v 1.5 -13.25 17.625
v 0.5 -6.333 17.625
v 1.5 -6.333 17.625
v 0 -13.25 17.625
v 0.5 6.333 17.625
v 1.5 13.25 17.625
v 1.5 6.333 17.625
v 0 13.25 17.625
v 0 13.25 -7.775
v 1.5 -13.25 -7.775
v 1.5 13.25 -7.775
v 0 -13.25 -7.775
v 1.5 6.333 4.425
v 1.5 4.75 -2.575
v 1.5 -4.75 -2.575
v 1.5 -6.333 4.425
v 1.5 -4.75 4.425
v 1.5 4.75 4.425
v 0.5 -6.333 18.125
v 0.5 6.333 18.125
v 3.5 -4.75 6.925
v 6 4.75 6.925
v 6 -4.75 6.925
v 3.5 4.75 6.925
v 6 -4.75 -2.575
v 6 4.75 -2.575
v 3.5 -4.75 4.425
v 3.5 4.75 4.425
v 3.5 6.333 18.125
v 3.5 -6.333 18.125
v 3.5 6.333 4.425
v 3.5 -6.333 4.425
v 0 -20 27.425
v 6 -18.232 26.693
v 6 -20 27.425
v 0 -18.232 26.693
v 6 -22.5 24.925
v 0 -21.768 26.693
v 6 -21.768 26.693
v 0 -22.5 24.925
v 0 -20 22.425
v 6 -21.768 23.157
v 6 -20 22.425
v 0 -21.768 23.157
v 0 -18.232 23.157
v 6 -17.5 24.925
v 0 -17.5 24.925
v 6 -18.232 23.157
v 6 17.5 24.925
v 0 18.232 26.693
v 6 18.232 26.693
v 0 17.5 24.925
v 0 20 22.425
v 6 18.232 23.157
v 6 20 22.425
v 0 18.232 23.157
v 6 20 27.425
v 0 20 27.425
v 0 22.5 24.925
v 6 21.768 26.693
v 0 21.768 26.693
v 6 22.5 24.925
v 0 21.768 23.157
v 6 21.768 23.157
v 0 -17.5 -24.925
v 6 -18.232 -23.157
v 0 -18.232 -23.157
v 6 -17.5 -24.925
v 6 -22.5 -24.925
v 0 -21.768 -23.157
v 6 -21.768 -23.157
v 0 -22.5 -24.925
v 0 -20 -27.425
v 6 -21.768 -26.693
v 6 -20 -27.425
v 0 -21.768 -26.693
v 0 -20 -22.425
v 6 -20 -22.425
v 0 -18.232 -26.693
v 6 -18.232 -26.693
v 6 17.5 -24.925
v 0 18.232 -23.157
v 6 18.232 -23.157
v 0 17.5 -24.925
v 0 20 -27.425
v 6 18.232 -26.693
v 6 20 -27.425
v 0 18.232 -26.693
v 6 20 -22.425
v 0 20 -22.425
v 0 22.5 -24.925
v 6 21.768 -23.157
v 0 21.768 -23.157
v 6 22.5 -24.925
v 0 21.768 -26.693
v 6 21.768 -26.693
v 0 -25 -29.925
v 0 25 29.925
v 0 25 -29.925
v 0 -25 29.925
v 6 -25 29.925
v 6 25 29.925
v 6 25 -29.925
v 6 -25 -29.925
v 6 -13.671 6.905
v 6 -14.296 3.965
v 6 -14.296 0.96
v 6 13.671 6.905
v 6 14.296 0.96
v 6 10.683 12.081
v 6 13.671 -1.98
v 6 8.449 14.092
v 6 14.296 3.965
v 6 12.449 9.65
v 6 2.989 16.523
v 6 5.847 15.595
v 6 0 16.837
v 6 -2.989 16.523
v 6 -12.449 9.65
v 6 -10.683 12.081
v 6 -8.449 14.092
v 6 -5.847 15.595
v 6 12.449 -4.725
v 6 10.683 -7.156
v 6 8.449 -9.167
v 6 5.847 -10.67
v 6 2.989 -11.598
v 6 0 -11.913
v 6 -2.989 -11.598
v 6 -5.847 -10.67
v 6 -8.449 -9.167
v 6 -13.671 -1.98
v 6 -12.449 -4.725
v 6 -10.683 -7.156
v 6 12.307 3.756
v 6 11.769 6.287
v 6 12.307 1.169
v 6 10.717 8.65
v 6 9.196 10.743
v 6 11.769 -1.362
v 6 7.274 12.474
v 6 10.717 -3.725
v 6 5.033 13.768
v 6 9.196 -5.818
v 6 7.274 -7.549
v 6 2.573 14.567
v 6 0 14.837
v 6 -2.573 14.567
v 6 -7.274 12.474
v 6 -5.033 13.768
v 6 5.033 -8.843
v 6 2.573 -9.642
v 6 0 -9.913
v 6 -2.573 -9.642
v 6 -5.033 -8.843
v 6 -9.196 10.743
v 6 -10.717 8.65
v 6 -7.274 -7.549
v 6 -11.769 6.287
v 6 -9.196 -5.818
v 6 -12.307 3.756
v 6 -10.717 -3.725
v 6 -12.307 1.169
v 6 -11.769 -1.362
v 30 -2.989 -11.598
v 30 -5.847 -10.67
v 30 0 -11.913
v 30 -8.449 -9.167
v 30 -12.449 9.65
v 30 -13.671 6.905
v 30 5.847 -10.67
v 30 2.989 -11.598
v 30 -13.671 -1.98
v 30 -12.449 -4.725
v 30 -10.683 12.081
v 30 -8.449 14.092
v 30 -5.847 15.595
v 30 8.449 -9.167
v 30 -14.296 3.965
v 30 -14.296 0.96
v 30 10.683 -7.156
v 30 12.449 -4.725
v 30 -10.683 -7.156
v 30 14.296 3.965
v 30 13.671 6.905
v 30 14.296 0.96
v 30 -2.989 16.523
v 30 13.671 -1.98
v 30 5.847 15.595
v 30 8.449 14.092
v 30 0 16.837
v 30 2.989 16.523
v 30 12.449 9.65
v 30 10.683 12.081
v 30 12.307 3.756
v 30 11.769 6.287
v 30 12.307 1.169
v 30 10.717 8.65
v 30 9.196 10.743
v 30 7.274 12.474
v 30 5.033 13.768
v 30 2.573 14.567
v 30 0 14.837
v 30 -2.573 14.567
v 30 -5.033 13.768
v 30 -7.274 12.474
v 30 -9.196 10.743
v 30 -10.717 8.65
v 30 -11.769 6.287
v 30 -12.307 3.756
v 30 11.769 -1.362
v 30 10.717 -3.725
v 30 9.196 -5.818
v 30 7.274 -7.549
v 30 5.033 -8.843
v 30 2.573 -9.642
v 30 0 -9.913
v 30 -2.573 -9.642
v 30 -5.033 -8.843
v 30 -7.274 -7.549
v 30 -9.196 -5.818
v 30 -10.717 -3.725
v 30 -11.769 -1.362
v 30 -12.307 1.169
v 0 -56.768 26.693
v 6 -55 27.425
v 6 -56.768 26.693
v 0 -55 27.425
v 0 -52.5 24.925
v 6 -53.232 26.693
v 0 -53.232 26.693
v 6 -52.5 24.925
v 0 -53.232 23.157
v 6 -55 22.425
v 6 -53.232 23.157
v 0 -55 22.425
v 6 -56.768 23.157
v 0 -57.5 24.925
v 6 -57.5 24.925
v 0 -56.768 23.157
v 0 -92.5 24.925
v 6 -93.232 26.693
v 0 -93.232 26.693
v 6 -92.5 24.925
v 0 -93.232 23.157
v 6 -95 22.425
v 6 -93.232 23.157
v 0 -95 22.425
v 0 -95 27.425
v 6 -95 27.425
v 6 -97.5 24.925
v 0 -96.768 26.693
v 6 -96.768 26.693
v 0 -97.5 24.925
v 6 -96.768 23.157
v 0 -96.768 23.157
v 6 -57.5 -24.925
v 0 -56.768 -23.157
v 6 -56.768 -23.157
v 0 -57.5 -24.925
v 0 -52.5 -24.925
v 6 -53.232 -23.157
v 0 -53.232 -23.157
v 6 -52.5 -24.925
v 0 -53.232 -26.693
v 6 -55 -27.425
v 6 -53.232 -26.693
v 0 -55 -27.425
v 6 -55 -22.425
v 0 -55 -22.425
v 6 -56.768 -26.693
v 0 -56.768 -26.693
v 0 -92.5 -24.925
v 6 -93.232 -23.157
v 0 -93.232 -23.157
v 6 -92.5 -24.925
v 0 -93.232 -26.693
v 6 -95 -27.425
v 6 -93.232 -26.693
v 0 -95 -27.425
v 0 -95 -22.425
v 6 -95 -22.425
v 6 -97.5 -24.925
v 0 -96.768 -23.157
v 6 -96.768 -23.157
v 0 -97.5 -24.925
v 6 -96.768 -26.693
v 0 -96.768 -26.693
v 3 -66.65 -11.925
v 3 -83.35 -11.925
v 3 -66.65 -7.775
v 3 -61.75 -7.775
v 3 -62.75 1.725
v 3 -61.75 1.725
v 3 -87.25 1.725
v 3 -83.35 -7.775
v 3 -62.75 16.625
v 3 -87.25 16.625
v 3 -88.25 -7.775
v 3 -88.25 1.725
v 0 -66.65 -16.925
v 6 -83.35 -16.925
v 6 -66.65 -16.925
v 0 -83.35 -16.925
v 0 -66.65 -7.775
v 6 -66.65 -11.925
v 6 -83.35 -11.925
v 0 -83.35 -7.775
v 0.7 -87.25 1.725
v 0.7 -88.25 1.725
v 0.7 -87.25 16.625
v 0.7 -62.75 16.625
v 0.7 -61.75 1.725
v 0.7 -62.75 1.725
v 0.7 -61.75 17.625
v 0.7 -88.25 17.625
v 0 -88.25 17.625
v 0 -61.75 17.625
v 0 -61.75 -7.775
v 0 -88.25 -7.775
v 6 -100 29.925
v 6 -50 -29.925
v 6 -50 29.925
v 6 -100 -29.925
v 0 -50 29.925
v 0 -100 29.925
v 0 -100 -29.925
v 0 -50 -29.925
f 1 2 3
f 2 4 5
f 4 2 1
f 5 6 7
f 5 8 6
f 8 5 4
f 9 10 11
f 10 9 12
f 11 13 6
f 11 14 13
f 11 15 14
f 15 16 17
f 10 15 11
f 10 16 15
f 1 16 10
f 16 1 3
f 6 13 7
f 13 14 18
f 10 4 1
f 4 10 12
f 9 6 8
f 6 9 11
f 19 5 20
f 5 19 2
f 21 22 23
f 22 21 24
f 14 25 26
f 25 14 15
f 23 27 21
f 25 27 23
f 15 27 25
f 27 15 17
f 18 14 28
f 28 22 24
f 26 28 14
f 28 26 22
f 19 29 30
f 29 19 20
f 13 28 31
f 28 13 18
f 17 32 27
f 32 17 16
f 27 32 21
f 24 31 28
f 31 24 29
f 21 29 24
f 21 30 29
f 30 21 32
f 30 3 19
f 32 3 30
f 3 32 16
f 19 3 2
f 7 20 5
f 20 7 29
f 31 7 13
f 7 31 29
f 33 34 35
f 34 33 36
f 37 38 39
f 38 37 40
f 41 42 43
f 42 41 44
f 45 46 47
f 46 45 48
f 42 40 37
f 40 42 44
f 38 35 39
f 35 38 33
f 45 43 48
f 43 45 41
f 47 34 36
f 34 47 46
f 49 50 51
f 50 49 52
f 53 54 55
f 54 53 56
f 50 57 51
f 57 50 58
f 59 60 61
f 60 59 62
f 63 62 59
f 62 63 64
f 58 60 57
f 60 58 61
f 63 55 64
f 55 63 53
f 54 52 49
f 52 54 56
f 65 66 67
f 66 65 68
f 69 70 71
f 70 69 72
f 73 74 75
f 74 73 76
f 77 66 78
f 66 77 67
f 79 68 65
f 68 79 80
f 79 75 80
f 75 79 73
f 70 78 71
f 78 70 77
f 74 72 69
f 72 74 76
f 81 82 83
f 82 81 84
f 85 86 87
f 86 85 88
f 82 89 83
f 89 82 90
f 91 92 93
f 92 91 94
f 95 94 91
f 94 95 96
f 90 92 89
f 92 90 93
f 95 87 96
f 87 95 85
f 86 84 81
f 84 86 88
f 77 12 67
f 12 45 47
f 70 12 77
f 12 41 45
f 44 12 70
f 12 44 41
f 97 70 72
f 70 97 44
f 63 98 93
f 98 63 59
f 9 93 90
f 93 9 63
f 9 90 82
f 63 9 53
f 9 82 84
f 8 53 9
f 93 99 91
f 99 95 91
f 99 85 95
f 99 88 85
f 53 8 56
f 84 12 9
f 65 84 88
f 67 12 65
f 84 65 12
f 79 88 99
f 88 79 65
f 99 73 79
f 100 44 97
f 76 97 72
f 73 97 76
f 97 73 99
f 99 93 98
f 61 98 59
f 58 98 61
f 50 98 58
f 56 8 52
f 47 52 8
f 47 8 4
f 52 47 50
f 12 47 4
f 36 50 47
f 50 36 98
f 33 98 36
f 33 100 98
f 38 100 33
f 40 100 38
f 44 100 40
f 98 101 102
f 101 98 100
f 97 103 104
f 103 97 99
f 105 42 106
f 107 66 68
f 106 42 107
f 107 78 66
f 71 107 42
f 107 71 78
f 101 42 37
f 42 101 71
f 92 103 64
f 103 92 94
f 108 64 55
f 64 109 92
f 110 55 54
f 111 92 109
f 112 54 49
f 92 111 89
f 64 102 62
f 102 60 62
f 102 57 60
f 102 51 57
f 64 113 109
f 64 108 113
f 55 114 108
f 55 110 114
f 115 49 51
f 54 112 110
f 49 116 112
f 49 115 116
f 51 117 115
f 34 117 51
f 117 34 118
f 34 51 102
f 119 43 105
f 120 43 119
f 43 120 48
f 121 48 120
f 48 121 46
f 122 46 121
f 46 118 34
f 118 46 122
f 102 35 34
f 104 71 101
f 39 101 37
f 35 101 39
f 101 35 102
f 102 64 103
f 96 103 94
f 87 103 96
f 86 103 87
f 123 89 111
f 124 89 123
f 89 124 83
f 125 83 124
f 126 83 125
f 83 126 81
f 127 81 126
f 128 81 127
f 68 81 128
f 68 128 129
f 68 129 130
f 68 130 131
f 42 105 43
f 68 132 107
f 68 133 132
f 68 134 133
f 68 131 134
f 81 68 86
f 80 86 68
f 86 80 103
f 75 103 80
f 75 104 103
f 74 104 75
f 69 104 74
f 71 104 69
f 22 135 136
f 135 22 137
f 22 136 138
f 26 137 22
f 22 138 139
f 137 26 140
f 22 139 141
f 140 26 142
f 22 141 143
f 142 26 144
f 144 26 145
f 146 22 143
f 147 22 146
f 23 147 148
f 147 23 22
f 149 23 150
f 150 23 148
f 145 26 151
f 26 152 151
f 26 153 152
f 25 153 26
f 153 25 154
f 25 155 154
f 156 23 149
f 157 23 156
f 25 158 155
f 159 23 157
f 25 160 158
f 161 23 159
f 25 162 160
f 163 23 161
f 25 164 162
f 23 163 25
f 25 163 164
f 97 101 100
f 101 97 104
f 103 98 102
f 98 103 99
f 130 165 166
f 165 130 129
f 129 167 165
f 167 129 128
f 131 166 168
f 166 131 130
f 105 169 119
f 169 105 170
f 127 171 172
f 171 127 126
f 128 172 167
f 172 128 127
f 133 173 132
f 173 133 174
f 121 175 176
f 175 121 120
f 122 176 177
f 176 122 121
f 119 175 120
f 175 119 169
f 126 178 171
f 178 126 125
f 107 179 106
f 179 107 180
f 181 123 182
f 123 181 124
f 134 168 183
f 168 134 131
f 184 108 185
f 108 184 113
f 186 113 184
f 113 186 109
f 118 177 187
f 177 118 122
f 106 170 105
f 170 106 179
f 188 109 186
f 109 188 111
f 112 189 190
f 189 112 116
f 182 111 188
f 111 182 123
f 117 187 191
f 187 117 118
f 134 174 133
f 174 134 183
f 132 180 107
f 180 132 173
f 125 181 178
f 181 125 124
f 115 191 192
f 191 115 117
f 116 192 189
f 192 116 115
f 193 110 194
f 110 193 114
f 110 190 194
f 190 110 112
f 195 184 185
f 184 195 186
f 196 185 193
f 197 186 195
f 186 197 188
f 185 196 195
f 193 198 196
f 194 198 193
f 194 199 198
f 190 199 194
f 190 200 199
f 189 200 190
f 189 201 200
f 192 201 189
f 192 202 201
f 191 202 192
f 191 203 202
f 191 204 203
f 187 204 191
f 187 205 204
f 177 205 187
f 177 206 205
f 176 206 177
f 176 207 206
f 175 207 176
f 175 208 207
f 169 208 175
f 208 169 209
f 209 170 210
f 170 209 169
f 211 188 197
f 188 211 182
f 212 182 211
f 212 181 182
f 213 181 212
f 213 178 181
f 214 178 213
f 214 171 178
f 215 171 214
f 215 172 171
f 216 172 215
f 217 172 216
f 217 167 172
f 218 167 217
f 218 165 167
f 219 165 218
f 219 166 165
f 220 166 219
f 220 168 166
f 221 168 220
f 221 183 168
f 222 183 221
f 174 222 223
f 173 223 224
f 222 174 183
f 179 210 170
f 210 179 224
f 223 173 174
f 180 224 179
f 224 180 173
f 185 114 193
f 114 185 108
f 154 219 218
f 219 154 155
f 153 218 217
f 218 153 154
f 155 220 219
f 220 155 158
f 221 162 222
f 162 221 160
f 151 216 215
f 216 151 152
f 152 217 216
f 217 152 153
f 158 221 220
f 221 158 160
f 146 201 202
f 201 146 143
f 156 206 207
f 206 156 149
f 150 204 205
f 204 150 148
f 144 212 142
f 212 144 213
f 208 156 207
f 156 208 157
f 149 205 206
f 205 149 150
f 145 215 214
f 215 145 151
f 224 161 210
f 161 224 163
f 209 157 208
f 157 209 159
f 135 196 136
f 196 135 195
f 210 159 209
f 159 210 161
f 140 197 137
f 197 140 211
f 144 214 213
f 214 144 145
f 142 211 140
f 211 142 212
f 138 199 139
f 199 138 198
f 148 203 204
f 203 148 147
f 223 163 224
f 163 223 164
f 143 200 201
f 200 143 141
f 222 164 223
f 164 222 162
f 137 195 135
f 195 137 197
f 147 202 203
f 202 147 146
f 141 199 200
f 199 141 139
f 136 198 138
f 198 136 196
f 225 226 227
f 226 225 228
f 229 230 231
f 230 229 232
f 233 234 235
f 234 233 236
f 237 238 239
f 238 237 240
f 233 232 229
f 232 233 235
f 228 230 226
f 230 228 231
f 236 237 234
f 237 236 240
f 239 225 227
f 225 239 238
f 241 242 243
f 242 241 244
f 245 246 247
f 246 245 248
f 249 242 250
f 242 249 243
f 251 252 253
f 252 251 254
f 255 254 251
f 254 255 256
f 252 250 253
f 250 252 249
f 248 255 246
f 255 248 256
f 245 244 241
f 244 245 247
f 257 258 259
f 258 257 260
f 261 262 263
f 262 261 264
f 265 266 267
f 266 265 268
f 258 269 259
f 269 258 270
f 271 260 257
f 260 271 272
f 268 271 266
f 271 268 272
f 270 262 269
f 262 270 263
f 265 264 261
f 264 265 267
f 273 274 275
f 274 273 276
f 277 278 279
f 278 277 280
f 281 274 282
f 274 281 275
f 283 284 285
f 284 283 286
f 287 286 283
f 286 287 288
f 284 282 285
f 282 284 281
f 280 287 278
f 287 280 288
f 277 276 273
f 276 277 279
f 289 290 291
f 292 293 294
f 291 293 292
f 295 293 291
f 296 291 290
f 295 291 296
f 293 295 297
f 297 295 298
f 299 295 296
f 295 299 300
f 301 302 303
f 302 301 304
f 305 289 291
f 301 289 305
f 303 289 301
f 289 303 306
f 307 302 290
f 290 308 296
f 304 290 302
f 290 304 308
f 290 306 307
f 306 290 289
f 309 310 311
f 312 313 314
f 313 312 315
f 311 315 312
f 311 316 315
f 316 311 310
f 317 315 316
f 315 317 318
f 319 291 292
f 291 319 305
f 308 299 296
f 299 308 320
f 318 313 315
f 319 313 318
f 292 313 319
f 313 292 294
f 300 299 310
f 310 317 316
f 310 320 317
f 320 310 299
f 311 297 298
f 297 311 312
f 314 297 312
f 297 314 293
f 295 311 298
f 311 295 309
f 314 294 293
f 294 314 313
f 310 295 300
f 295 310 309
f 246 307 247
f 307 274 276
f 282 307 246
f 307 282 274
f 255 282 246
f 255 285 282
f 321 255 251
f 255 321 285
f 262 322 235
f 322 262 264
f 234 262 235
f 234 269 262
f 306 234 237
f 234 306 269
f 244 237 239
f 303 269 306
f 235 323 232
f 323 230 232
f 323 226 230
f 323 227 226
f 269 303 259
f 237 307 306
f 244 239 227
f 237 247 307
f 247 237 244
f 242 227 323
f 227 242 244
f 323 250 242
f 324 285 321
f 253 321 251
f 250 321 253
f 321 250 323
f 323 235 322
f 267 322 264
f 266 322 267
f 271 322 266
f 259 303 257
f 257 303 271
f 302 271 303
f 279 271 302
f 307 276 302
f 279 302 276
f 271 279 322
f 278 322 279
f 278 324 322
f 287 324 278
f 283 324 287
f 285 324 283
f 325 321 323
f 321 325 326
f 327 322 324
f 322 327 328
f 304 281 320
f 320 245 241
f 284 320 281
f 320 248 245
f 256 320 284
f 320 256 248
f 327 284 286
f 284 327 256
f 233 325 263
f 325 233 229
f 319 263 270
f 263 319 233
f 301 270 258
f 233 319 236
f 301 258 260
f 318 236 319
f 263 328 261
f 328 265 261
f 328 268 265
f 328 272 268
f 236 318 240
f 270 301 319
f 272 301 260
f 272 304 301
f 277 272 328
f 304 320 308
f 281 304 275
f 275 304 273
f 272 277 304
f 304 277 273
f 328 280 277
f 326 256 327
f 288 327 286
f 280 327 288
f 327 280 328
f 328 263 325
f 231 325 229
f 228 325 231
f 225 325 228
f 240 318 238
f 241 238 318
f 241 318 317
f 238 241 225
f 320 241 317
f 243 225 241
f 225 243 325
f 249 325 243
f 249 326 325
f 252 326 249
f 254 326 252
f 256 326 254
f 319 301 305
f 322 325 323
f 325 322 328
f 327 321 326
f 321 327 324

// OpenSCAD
// file: ../cameramount/PiCameraMount.scad
/*
 * openSCAD for a simple mount for the Raspberry PI Camera Module
 *
 * This file is not for standalone use - it's included in to another
 * openSCAN file for including in to another model.
 *
 * Copyright 2015 Peter T Mount
 * 
 * Licensed under the Apache License, Version 2.0 (the "License");
 * you may not use this file except in compliance with the License.
 * You may obtain a copy of the License at
 * 
 * http://www.apache.org/licenses/LICENSE-2.0
 * 
 * Unless required by applicable law or agreed to in writing, software
 * distributed under the License is distributed on an "AS IS" BASIS,
 * WITHOUT WARRANTIES OR CONDITIONS OF ANY KIND, either express or implied.
 * See the License for the specific language governing permissions and
 * limitations under the License.
 *
 */

/*
 * Measured dimensions of a PI Camera Module.
 *
 * These are based on actual measurements and those manually measured by Gert van Loo
 * and published on Scribd:
 *
 *		http://www.scribd.com/doc/142718448/Raspberry-Pi-Camera-Mechanical-Data
 *
 * Width & Depth are the exterior dimensions, width being the edge with the ribbon.
 *
 * We add 1.5 to these to give some room and account for the printer as it seems
 * to give a better fit.
 *
 * y offset is the height from the bottom of the center of the camera lens.
 *
 * ribbon width is just that, if required
 */
piCameraWidth=25 +1.5;
piCameraDepth=23.9 +1.5;
piCameraRibbonWidth=16.2 +0.5;
piCameraLensSize=8 +1.5;
piCameraYOffset=5.1+(piCameraLensSize/2);

/*
 * Module to render a PI camera mount.
 *
 * To use translate it into the required position so that the camera lens
 * is at the origin & pointing along the x axis.
 *
 * Then call piCameraMount(radius,mode)
 *
 * Where:
 *		width	the width of the component
 *		mode	The mode of the render
 *
 * The width must be >30mm as it's used to include the mounting hardware.
 * However you can enlarge it.
 *
 * The mode defines how it's rendered:
 *		0	Render the front panel
 *		1	Render the back panel
 *		2	Render a plain panel with just the mounting holes
 *    3	As 1 but cable exit on back is internal rather than at the bottom of the plate
 */

module piCamera(width,mode) {
	assign(
		tubeRadius=width/2,
		piCameraLensHalf=piCameraLensSize/2,
		piCameraWHalf=piCameraWidth/2,
		piCameraDHalf=piCameraDepth/2,
		offset=piCameraYOffset
	) {
		translate([0,0,piCameraYOffset/2]) union() {
			// Front panel
			difference() {
				if(mode==1 || mode==3)
					translate([6,-tubeRadius,-tubeRadius-offset]) cube([6,width,width+offset]);
				else
					translate([0,-tubeRadius,-tubeRadius-offset]) cube([6,width,width+offset]);

//				translate([4,-tubeRadius-1,-tubeRadius-offset-1]) cube([2,width+2,width+offset+2]);

				if(mode!=2) {
					// Holder for the pi camera module
					translate([4.5,-piCameraWHalf,-piCameraDHalf])
						cube([2.2,piCameraWidth,piCameraDepth]);

					// Holder for components on rear of module
					translate([6,1-piCameraWHalf,1-piCameraDHalf])
						cube([3,piCameraWidth-2,piCameraDepth-2]);
					translate([6,-piCameraWHalf,-piCameraDHalf])
						cube([3,piCameraWidth,9.5]);

					// Hole for the camera lens
					translate([-0.5,-piCameraLensHalf,2-piCameraLensSize])
						cube([6,piCameraLensSize,piCameraLensSize]);

					// Indent for ribbon holder on front of the module
					translate([2.5,-piCameraLensSize*2/3,-0.5])
						cube([3,piCameraLensSize*4/3,piCameraDHalf+1]);
		
					// Space for ribbon cable
					if(mode==1)
						translate([ 5, -piCameraRibbonWidth/2,-tubeRadius-1-offset])
							cube([3,piCameraRibbonWidth,tubeRadius+1+offset]);
					else if(mode==3) {
						translate([ 5, -piCameraRibbonWidth/2,14-tubeRadius-1-offset])
							cube([4,piCameraRibbonWidth,15]);
						translate([ 5, -piCameraRibbonWidth/2,14-tubeRadius-1-offset])
							cube([10,piCameraRibbonWidth,5]);
					}
				}

				// M4 mounting holes
				piCameraHoles(width,15);
			}
		}

	}
}

module piCameraHoles(width,h) {
	assign(tubeRadius=width/2) {
		for(h=[0:3])
			translate([-1,
				(h%2) ? (-tubeRadius+5) : (tubeRadius-5),
				(floor(h/2)) ? (-tubeRadius+5-piCameraYOffset) : (tubeRadius-5)
			])
			rotate([0,90,0])
			cylinder(h=15,r=2.5);
	}
}
// file: ../Common.scad
/*
 * openSCAD Common features
 *
 * This file is not for standalone use - it's included in to another
 * openSCAN file for including in to another model.
 *
 * Copyright 2015 Peter T Mount
 * 
 * Licensed under the Apache License, Version 2.0 (the "License");
 * you may not use this file except in compliance with the License.
 * You may obtain a copy of the License at
 * 
 * http://www.apache.org/licenses/LICENSE-2.0
 * 
 * Unless required by applicable law or agreed to in writing, software
 * distributed under the License is distributed on an "AS IS" BASIS,
 * WITHOUT WARRANTIES OR CONDITIONS OF ANY KIND, either express or implied.
 * See the License for the specific language governing permissions and
 * limitations under the License.
 *
 */

/*
 * Bolt sizes - these are for the holes hence +0.25mm, measurements in radius
 */
M4=2.25;
M5=2.75;
M6=3.25;

/*
 * Raspberry PI Specification
 */
// Dimensions of a HAT
PIHAT_WIDTH=65;
PIHAT_HEIGHT=56.5;

// Edge radius
PIHAT_EDGE_RADIUS=3;

// Hole spacing, center-to-center
PIHAT_WIDTH_HOLE=58;
PIHAT_DEPTH_HOLE=49;

// Hole diameter on HAT as per spec
PIHAT_HOLE_DIAM=2.75;

// Max diameter of hole PAD on HAT as per spec
PIHAT_HOLE_PAD_DIAM=6.2;

// Hole offset from HAT corners
PIHAT_OFFSET_X=3.5;
PIHAT_OFFSET_Y=3.5;

// PI dimensions. A+ is same size as the HAT, B+, 2B, 3B are wider by 25mm
PI_A_WIDTH=PIHAT_WIDTH;
PI_A_HEIGHT=PIHAT_HEIGHT;

PI_B_WIDTH=85;
PI_B_HEIGHT=PIHAT_HEIGHT;

PI_Z_WIDTH=65;
PI_Z_HEIGHT=30;

// The Camera/DSI slot dimensions
PI_CSI_WIDTH=17;
PI_CSI_HEIGHT=2;

// Position of CSI from bottom left
PI_CSI_OFFSET_X=45;
PI_CSI_OFFSET_Y=11.5;

// Position of DSI from bottom left
PI_DSI_OFFSET_X=5;
PI_DSI_OFFSET_Y=PIHAT_HEIGHT/2;

// Position of GPIO connector from Top Left mounting hole
PI_GPIO_OFFSET_X=29;
PI_GPIO_OFFSET_Y=0;
PI_GPIO_WIDTH=PIHAT_WIDTH_HOLE-PIHAT_HOLE_DIAM-1;
PI_GPIO_DEPTH=12;
PI_GPIO_HEIGHT=5;
// file: eyepiece.scad
/*
 * openSCAD for an adapter for attaching the Raspberry PI Camera Module 
 * to a telescope.
 *
 * This model comes in two parts, the eyepiece mount which attaches directly
 * to the telescope (no eyepiece required) and the back plate.
 *
 * However it's intended that the backplate be incorporated into another model
 * so that the PI itself is mounted with the camera.
 *
 * Copyright 2015 Peter T Mount
 * 
 * Licensed under the Apache License, Version 2.0 (the "License");
 * you may not use this file except in compliance with the License.
 * You may obtain a copy of the License at
 * 
 * http://www.apache.org/licenses/LICENSE-2.0
 * 
 * Unless required by applicable law or agreed to in writing, software
 * distributed under the License is distributed on an "AS IS" BASIS,
 * WITHOUT WARRANTIES OR CONDITIONS OF ANY KIND, either express or implied.
 * See the License for the specific language governing permissions and
 * limitations under the License.
 *
 */

include <../Common.scad>
include <../cameramount/PiCameraMount.scad>

module eyepiece(diam,mode) {
	// eyediam is the eyepiece diameter, adjusting for extruder diameter
	assign(
		eyediam=(diam*25.4)-3
	) {
		assign(
			eyerad=eyediam/2,
			eyewidth=max(50,eyediam+10)
		) {
			if(mode==0 || mode==2) translate([-6,0,0]) eyepieceFront(eyewidth,eyerad);
			if(mode==1 || mode==2) translate([-6,0,0]) eyepieceBack(eyewidth);
			if(mode==3) {
			  	translate([6,0,0]) rotate([0,0,180]) eyepieceFront(eyewidth,eyerad);
				translate([-6,-eyewidth*3/2,0]) eyepieceBack(eyewidth);
			}
		}
	}
}

module eyepieceFront(eyewidth,eyerad) {
	union() {
		piCamera(eyewidth,0);
		translate([-24,0,piCameraYOffset/4]) rotate([0,90,0]) difference() {
			cylinder( h=24,r=eyerad);
			translate([0,0,-2]) cylinder( h=27,r=eyerad-2);
		}
	}
}

module eyepieceBack(eyewidth) {
	piCamera(eyewidth,3);
}
// main file
/*
 * openSCAD for an adapter for attaching the Raspberry PI Camera Module 
 * to a telescope.
 *
 * This model comes in two parts, the eyepiece mount which attaches directly
 * to the telescope (no eyepiece required) and the back plate.
 *
 * However it's intended that the backplate be incorporated into another model
 * so that the PI itself is mounted with the camera.
 *
 * Copyright 2015 Peter T Mount
 * 
 * Licensed under the Apache License, Version 2.0 (the "License");
 * you may not use this file except in compliance with the License.
 * You may obtain a copy of the License at
 * 
 * http://www.apache.org/licenses/LICENSE-2.0
 * 
 * Unless required by applicable law or agreed to in writing, software
 * distributed under the License is distributed on an "AS IS" BASIS,
 * WITHOUT WARRANTIES OR CONDITIONS OF ANY KIND, either express or implied.
 * See the License for the specific language governing permissions and
 * limitations under the License.
 *
 */

include <eyepiece.scad>

eyepiece(1.25,3);
